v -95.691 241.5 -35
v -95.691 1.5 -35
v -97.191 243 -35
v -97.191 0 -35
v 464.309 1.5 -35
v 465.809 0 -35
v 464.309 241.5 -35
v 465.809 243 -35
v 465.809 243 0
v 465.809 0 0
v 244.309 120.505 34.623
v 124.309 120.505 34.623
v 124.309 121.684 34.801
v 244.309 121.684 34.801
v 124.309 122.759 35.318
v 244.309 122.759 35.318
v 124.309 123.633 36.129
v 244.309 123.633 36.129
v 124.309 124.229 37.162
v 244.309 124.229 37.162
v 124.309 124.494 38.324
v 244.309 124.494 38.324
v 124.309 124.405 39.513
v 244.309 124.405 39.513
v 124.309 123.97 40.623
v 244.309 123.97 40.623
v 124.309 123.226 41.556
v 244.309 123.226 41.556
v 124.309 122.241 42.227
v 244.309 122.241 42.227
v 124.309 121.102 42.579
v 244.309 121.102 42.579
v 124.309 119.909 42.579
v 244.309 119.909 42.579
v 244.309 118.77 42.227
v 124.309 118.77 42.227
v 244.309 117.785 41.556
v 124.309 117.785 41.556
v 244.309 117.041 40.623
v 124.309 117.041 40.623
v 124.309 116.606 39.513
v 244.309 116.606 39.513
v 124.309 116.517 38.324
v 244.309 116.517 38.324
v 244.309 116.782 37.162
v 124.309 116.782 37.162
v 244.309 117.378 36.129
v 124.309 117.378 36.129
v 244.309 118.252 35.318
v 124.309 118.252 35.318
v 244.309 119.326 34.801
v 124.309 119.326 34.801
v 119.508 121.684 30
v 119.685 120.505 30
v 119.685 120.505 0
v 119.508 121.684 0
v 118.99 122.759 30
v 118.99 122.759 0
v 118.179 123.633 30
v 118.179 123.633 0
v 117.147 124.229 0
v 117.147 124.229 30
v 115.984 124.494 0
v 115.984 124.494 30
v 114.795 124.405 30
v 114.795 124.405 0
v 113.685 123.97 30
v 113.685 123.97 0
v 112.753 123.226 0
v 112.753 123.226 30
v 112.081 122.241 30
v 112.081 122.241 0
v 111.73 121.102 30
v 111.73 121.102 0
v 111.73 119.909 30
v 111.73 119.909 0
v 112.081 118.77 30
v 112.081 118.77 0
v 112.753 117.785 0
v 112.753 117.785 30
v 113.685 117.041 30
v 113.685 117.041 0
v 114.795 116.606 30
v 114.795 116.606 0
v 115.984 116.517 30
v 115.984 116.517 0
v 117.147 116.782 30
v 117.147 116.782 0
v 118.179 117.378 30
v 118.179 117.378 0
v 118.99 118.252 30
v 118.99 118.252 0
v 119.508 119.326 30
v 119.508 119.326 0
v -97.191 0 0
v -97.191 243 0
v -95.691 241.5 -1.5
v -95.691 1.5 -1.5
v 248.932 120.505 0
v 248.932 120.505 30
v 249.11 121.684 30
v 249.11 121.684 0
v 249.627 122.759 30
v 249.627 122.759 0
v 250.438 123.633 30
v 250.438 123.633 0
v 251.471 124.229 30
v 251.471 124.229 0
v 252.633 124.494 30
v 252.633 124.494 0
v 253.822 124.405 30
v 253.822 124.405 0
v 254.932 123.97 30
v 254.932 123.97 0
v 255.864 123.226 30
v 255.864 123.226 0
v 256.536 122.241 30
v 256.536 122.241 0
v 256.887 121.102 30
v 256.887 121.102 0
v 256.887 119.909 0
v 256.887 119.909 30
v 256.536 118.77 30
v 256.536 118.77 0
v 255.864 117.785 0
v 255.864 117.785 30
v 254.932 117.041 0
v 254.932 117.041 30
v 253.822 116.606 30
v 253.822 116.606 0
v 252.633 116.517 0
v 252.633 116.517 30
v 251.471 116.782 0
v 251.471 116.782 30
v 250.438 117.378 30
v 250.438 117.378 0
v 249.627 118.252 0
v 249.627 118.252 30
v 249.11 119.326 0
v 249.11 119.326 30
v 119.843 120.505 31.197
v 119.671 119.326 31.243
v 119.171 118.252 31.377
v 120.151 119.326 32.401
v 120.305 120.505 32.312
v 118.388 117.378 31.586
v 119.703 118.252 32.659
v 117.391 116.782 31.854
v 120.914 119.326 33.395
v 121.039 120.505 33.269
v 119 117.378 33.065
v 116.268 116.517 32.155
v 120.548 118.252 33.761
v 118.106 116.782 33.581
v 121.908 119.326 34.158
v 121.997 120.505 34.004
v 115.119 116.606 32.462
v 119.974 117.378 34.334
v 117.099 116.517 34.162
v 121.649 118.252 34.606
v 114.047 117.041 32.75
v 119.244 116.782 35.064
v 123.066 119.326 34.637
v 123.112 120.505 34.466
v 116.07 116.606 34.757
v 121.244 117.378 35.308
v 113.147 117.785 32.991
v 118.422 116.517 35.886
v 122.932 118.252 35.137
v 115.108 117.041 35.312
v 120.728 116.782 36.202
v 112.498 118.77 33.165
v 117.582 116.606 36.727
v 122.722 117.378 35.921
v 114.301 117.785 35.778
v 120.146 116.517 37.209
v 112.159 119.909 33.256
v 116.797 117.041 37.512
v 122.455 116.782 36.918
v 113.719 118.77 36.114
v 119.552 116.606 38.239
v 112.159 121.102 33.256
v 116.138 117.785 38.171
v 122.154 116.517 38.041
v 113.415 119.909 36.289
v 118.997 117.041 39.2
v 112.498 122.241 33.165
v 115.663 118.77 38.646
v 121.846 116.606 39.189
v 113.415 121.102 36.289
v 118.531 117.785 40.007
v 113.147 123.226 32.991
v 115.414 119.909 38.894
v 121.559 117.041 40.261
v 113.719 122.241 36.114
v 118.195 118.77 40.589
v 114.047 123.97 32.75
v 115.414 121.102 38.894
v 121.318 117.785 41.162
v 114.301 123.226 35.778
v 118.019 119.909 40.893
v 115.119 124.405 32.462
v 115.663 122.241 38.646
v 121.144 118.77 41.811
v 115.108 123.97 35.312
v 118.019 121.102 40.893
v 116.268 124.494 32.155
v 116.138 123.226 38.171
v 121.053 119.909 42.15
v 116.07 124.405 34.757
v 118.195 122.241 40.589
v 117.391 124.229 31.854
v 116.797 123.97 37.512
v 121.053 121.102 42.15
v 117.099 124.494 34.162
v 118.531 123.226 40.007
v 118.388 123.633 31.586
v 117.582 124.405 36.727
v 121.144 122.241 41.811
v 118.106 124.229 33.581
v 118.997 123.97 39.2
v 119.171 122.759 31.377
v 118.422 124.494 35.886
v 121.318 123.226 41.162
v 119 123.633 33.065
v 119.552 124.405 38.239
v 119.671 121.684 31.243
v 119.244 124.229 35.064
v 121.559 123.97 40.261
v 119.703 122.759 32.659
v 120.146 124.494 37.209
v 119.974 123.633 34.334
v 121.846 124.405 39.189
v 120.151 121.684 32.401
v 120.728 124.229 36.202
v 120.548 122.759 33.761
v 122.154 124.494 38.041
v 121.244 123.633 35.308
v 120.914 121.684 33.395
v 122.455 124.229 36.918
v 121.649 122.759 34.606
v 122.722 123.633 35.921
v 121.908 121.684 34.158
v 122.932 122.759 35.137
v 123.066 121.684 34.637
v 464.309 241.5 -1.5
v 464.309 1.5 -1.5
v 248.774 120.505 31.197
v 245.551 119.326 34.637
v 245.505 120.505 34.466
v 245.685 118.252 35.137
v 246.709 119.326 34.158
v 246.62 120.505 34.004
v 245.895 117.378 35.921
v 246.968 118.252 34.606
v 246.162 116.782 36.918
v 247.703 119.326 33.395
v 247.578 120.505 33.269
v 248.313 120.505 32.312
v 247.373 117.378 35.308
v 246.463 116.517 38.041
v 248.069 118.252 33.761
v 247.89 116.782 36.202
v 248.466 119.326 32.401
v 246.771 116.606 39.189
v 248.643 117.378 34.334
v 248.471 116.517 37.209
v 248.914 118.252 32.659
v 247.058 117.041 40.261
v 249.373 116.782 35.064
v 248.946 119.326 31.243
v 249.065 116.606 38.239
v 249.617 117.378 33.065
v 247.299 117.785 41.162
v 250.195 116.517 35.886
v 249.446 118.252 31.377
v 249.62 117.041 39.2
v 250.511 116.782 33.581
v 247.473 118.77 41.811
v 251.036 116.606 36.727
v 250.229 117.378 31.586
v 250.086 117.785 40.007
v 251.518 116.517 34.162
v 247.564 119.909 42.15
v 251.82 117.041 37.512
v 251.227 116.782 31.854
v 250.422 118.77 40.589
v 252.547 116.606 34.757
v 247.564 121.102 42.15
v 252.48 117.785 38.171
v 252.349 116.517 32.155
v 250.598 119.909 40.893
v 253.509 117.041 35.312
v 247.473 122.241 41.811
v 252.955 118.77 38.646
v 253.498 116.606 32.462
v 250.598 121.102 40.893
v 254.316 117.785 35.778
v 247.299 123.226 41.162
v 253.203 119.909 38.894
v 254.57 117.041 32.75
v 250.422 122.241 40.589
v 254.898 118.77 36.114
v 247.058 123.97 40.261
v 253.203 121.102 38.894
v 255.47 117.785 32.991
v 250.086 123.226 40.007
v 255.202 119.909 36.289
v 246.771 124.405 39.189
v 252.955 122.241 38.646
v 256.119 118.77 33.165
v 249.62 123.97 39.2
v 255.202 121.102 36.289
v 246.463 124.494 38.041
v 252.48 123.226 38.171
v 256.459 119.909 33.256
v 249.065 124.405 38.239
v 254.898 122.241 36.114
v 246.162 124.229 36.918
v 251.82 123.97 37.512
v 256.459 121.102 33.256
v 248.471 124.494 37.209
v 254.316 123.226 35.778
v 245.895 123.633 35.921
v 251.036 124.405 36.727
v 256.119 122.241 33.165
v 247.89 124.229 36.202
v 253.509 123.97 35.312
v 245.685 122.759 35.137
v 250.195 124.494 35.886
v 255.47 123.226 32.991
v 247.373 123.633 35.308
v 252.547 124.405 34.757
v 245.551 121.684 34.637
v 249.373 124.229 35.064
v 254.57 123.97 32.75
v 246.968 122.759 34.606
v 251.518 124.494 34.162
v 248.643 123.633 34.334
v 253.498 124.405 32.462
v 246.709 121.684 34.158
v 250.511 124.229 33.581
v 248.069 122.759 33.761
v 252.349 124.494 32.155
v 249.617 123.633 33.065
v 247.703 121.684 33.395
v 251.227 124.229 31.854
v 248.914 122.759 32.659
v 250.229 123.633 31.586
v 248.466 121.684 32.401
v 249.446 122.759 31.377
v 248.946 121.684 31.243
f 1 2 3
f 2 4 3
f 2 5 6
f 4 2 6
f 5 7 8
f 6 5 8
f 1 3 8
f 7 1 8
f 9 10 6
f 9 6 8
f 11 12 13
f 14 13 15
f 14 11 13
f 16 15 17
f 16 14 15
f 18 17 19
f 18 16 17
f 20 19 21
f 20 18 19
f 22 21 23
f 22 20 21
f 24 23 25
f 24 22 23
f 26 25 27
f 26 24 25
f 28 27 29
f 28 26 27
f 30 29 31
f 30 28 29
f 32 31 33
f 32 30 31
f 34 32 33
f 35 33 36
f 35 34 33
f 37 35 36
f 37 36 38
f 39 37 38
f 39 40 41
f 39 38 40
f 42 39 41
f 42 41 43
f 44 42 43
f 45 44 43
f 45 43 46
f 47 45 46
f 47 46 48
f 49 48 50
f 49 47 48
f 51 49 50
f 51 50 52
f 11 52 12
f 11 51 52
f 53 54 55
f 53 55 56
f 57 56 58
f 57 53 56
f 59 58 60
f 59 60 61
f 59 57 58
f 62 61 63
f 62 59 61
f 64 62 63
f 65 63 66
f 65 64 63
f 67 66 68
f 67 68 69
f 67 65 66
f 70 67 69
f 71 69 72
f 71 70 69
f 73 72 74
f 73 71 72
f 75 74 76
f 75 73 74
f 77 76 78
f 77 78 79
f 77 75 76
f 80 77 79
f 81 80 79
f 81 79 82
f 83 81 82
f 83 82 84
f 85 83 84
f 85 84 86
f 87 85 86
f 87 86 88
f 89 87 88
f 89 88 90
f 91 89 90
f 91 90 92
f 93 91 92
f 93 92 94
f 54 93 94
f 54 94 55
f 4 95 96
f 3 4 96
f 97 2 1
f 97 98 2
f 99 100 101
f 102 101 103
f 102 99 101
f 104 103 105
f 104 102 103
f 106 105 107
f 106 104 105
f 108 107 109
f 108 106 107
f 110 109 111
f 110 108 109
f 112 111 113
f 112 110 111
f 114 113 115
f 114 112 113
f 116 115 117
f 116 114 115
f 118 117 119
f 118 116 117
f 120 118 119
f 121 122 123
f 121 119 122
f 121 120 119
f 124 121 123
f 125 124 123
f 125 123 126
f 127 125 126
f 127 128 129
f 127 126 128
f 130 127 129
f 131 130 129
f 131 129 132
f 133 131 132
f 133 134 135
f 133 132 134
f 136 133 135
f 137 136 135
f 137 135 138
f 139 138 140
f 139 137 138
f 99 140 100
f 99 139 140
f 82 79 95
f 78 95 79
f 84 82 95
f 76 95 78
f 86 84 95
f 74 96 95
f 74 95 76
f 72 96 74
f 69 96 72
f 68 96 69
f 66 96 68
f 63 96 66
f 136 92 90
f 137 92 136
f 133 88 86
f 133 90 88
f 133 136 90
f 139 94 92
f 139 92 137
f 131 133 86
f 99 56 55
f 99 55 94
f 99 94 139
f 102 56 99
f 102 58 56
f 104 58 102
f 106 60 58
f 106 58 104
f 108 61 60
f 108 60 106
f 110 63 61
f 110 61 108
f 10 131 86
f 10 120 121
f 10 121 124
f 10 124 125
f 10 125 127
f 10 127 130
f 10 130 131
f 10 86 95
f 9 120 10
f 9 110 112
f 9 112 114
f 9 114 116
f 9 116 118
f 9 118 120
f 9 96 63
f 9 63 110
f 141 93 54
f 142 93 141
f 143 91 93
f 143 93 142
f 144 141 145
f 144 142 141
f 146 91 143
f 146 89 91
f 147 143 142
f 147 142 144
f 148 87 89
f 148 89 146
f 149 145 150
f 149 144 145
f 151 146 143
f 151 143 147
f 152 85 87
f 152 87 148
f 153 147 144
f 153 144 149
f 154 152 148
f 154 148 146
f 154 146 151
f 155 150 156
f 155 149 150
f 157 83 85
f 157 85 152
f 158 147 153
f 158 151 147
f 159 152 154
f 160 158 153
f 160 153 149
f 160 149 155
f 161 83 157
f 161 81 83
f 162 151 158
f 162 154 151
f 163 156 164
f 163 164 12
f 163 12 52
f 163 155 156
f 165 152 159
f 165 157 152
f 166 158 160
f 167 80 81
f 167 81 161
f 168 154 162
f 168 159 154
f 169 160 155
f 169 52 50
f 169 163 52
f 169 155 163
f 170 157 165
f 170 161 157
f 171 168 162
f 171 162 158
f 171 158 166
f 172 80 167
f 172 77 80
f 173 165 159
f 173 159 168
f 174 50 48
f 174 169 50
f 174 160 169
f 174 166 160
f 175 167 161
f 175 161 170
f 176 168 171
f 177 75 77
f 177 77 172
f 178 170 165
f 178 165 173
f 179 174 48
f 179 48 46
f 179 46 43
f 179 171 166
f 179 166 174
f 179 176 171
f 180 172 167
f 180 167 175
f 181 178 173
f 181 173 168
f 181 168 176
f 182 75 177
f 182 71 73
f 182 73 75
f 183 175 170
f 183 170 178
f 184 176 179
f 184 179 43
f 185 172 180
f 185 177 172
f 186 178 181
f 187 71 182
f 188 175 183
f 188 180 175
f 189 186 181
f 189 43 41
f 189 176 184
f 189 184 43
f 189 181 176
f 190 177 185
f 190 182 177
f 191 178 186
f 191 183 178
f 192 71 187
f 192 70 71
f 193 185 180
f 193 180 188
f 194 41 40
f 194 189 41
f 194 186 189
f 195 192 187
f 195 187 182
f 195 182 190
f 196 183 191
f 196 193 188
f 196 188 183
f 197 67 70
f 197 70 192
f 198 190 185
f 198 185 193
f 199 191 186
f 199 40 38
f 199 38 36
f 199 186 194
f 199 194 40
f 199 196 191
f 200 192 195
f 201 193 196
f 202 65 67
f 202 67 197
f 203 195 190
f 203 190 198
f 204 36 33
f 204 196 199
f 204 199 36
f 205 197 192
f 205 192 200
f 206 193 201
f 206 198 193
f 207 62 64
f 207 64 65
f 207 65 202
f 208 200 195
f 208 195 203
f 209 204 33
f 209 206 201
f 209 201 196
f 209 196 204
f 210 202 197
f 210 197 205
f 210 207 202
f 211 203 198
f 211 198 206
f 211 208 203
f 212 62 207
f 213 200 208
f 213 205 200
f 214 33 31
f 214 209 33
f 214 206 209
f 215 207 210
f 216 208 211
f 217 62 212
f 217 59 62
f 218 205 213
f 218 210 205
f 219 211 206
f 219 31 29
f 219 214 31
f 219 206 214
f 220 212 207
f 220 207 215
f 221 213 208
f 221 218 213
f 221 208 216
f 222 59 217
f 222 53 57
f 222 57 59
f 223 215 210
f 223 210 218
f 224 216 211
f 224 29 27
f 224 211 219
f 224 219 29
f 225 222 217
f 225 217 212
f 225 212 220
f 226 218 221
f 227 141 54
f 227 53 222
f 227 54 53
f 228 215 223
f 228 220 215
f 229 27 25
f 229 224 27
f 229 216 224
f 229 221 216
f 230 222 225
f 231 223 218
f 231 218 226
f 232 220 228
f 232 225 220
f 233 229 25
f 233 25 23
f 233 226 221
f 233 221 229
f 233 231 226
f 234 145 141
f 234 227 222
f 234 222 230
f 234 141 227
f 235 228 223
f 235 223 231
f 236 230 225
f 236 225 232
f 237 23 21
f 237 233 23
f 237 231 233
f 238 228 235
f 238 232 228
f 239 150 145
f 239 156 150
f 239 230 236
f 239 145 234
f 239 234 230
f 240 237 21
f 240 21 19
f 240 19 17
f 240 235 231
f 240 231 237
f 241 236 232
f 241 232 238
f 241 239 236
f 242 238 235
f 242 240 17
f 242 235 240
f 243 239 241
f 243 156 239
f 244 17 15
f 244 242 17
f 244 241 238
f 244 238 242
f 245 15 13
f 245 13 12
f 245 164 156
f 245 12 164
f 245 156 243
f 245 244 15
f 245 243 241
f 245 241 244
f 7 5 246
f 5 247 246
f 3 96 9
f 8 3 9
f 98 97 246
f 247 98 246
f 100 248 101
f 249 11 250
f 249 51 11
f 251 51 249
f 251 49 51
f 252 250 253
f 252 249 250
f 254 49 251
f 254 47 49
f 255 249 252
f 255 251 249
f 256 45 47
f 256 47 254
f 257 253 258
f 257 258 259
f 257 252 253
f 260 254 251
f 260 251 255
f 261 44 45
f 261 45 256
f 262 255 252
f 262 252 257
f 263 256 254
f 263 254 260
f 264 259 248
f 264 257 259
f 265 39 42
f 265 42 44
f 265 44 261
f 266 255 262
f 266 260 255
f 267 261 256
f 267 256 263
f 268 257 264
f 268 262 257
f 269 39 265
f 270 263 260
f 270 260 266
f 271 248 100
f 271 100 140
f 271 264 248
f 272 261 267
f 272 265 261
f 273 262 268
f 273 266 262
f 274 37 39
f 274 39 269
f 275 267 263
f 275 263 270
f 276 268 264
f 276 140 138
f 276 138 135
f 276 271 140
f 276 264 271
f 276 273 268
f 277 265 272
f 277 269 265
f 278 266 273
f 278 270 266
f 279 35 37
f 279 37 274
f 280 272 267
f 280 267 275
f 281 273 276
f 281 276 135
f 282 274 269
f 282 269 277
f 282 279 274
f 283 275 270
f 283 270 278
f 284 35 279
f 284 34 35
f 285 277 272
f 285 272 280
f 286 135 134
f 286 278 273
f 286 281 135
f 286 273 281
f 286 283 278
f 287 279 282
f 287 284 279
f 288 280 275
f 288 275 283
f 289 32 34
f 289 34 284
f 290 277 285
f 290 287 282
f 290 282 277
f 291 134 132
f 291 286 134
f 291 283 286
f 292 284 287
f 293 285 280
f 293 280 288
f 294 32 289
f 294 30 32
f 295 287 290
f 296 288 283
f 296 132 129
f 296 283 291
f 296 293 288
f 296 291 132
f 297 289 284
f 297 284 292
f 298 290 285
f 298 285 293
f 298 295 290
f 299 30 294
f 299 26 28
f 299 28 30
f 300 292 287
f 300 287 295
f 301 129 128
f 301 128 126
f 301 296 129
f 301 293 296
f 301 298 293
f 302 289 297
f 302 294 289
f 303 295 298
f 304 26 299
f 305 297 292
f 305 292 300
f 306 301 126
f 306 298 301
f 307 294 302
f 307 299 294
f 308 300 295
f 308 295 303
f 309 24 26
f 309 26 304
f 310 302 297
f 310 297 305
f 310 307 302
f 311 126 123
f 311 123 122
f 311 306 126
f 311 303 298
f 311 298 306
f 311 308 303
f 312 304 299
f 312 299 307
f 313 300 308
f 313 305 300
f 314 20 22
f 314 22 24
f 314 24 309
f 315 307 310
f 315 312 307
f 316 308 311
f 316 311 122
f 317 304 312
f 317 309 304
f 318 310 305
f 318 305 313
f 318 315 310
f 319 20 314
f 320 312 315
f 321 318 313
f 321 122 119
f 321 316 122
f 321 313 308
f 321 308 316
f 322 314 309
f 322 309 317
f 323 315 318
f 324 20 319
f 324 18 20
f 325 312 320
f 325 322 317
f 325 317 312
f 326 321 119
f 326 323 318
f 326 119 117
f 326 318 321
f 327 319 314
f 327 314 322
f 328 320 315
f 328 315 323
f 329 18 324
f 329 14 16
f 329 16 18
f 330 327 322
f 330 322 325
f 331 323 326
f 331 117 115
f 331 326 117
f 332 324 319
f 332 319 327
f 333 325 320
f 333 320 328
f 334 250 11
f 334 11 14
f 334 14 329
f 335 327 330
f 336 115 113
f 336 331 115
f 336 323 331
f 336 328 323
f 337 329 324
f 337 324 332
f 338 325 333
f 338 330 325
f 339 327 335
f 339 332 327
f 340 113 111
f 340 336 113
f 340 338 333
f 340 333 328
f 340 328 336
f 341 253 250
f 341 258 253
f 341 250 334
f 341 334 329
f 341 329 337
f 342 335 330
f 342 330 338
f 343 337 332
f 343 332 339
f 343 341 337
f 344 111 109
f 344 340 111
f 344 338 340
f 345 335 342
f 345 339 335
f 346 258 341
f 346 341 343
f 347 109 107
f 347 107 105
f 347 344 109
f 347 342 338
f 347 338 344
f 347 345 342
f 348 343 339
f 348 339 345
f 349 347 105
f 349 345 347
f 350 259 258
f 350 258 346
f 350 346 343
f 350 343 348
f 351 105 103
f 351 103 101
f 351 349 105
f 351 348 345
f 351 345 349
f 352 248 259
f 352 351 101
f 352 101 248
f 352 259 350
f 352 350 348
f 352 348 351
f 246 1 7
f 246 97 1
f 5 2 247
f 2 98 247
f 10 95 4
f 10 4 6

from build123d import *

# Parameters (mm, degrees)
F0_W     = 563
F0_H     = 243
F1_DEPTH = 35
F2_T     = -1.5
F5_R     = 4


with BuildPart() as f1:
    # F0 (on Top) → F1 (new body)
    with BuildSketch(Plane.XY):
        with Locations((184.3085842729, 121.5)):
            Rectangle(F0_W, F0_H)
    extrude(amount=-F1_DEPTH)

    # F2
    f2_openings = [f1.faces().sort_by_distance(p)[0] for p in [
        (184.308584, 121.5, -35),
    ]]
    offset(amount=F2_T, openings=f2_openings)

    # F6: sweep along a path in F4
    with BuildLine(Plane.XZ.offset(-121.5)) as f6_path:
        Line((114.3085842729, 0), (114.3085842729, 30))
        ThreePointArc((114.3085842729, 30), (117.237516461, 37.0710678119), (124.3085842729, 40))
        Line((124.3085842729, 40), (244.3085842729, 40))
        ThreePointArc((244.3085842729, 40), (251.3796520847, 37.0710678119), (254.3085842729, 30))
        Line((254.3085842729, 30), (254.3085842729, 0))
    # F5 (on face) → F6 (sweep)
    with BuildSketch(Plane.XY):
        with Locations((115.6852245331, 120.5054670572)):
            Circle(F5_R)
    sweep(path=f6_path.line)


solid = f1.part
